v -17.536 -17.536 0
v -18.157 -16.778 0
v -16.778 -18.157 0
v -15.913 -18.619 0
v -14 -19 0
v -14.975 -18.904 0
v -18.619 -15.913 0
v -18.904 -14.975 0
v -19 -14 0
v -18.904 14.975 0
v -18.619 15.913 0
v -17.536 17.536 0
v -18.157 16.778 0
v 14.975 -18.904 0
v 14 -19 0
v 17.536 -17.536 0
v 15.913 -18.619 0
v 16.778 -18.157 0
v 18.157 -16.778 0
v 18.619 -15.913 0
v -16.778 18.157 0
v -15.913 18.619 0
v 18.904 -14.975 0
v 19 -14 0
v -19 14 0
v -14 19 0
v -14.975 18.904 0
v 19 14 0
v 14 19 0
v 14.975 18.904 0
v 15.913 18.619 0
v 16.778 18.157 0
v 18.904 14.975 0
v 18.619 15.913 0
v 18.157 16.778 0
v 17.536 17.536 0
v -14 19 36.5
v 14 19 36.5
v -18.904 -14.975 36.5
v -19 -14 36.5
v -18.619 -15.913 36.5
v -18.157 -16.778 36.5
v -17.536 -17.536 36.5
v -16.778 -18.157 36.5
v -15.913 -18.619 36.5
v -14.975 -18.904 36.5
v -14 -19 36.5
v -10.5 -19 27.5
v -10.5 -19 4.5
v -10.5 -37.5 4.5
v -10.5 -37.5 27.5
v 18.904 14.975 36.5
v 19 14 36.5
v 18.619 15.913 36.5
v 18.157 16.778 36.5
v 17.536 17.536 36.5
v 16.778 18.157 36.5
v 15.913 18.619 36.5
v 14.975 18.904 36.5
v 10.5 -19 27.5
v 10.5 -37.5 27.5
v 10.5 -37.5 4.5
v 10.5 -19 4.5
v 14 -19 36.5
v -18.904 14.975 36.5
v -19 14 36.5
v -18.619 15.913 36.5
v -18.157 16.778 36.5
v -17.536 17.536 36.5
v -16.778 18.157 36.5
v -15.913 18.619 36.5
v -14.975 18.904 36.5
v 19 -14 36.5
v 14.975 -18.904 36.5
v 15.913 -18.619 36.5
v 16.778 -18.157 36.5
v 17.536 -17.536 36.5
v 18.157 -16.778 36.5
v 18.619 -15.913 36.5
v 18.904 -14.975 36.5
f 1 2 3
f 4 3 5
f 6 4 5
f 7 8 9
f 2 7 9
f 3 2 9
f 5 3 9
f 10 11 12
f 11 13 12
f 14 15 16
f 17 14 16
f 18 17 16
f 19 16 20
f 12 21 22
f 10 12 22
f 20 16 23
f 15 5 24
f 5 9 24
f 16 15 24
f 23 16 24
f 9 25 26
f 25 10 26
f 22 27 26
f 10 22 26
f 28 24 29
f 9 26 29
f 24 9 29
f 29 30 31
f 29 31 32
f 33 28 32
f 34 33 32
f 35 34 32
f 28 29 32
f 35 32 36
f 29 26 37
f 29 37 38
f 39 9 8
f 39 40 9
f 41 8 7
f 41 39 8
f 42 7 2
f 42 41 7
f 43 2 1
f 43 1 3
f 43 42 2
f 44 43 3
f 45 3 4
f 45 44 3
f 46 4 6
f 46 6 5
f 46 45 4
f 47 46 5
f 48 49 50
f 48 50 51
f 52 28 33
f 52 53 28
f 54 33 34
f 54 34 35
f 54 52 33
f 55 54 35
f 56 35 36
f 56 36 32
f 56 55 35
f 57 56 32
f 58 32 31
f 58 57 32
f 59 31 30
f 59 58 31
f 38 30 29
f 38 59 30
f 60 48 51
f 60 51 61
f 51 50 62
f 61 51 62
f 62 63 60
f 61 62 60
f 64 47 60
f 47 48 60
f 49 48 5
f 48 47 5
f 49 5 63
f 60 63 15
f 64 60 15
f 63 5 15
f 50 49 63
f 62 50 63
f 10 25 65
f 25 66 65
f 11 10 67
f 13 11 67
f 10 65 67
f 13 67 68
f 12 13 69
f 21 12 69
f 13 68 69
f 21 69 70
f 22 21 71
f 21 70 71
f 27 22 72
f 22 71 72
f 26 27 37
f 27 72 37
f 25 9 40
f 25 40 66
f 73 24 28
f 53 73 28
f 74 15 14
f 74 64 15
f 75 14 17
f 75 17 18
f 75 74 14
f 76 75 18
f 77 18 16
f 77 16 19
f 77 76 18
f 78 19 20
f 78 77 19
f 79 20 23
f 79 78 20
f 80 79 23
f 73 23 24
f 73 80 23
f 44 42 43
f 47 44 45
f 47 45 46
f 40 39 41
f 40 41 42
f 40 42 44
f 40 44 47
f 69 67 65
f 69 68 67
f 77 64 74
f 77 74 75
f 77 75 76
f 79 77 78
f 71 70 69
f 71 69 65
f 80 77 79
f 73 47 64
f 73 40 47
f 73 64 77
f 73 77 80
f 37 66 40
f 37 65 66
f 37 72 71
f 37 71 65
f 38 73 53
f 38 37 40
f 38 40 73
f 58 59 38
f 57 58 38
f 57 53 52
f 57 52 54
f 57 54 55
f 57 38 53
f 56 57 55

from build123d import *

# Parameters (mm, degrees)
F0_W     = 38
F0_H     = 38
F1_DEPTH = 36.5
F2_R     = 5
F3_W     = 21
F3_H     = 23
F4_DEPTH = 18.5


with BuildPart() as f1:
    # F0 (on Top) → F1 (new body)
    with BuildSketch(Plane.XY):
        Rectangle(F0_W, F0_H)
    extrude(amount=F1_DEPTH)

    # F2
    f2_edges = [f1.edges().sort_by_distance(p)[0] for p in [
        (19, -19, 18.25),
        (19, 19, 18.25),
        (-19, 19, 18.25),
        (-19, -19, 18.25),
    ]]
    fillet(f2_edges, radius=F2_R)

    # F3 (on face) → F4 (join)
    with BuildSketch(Plane.XZ.offset(19)):
        with Locations((0, 16)):
            Rectangle(F3_W, F3_H)
    extrude(amount=F4_DEPTH)


solid = f1.part
